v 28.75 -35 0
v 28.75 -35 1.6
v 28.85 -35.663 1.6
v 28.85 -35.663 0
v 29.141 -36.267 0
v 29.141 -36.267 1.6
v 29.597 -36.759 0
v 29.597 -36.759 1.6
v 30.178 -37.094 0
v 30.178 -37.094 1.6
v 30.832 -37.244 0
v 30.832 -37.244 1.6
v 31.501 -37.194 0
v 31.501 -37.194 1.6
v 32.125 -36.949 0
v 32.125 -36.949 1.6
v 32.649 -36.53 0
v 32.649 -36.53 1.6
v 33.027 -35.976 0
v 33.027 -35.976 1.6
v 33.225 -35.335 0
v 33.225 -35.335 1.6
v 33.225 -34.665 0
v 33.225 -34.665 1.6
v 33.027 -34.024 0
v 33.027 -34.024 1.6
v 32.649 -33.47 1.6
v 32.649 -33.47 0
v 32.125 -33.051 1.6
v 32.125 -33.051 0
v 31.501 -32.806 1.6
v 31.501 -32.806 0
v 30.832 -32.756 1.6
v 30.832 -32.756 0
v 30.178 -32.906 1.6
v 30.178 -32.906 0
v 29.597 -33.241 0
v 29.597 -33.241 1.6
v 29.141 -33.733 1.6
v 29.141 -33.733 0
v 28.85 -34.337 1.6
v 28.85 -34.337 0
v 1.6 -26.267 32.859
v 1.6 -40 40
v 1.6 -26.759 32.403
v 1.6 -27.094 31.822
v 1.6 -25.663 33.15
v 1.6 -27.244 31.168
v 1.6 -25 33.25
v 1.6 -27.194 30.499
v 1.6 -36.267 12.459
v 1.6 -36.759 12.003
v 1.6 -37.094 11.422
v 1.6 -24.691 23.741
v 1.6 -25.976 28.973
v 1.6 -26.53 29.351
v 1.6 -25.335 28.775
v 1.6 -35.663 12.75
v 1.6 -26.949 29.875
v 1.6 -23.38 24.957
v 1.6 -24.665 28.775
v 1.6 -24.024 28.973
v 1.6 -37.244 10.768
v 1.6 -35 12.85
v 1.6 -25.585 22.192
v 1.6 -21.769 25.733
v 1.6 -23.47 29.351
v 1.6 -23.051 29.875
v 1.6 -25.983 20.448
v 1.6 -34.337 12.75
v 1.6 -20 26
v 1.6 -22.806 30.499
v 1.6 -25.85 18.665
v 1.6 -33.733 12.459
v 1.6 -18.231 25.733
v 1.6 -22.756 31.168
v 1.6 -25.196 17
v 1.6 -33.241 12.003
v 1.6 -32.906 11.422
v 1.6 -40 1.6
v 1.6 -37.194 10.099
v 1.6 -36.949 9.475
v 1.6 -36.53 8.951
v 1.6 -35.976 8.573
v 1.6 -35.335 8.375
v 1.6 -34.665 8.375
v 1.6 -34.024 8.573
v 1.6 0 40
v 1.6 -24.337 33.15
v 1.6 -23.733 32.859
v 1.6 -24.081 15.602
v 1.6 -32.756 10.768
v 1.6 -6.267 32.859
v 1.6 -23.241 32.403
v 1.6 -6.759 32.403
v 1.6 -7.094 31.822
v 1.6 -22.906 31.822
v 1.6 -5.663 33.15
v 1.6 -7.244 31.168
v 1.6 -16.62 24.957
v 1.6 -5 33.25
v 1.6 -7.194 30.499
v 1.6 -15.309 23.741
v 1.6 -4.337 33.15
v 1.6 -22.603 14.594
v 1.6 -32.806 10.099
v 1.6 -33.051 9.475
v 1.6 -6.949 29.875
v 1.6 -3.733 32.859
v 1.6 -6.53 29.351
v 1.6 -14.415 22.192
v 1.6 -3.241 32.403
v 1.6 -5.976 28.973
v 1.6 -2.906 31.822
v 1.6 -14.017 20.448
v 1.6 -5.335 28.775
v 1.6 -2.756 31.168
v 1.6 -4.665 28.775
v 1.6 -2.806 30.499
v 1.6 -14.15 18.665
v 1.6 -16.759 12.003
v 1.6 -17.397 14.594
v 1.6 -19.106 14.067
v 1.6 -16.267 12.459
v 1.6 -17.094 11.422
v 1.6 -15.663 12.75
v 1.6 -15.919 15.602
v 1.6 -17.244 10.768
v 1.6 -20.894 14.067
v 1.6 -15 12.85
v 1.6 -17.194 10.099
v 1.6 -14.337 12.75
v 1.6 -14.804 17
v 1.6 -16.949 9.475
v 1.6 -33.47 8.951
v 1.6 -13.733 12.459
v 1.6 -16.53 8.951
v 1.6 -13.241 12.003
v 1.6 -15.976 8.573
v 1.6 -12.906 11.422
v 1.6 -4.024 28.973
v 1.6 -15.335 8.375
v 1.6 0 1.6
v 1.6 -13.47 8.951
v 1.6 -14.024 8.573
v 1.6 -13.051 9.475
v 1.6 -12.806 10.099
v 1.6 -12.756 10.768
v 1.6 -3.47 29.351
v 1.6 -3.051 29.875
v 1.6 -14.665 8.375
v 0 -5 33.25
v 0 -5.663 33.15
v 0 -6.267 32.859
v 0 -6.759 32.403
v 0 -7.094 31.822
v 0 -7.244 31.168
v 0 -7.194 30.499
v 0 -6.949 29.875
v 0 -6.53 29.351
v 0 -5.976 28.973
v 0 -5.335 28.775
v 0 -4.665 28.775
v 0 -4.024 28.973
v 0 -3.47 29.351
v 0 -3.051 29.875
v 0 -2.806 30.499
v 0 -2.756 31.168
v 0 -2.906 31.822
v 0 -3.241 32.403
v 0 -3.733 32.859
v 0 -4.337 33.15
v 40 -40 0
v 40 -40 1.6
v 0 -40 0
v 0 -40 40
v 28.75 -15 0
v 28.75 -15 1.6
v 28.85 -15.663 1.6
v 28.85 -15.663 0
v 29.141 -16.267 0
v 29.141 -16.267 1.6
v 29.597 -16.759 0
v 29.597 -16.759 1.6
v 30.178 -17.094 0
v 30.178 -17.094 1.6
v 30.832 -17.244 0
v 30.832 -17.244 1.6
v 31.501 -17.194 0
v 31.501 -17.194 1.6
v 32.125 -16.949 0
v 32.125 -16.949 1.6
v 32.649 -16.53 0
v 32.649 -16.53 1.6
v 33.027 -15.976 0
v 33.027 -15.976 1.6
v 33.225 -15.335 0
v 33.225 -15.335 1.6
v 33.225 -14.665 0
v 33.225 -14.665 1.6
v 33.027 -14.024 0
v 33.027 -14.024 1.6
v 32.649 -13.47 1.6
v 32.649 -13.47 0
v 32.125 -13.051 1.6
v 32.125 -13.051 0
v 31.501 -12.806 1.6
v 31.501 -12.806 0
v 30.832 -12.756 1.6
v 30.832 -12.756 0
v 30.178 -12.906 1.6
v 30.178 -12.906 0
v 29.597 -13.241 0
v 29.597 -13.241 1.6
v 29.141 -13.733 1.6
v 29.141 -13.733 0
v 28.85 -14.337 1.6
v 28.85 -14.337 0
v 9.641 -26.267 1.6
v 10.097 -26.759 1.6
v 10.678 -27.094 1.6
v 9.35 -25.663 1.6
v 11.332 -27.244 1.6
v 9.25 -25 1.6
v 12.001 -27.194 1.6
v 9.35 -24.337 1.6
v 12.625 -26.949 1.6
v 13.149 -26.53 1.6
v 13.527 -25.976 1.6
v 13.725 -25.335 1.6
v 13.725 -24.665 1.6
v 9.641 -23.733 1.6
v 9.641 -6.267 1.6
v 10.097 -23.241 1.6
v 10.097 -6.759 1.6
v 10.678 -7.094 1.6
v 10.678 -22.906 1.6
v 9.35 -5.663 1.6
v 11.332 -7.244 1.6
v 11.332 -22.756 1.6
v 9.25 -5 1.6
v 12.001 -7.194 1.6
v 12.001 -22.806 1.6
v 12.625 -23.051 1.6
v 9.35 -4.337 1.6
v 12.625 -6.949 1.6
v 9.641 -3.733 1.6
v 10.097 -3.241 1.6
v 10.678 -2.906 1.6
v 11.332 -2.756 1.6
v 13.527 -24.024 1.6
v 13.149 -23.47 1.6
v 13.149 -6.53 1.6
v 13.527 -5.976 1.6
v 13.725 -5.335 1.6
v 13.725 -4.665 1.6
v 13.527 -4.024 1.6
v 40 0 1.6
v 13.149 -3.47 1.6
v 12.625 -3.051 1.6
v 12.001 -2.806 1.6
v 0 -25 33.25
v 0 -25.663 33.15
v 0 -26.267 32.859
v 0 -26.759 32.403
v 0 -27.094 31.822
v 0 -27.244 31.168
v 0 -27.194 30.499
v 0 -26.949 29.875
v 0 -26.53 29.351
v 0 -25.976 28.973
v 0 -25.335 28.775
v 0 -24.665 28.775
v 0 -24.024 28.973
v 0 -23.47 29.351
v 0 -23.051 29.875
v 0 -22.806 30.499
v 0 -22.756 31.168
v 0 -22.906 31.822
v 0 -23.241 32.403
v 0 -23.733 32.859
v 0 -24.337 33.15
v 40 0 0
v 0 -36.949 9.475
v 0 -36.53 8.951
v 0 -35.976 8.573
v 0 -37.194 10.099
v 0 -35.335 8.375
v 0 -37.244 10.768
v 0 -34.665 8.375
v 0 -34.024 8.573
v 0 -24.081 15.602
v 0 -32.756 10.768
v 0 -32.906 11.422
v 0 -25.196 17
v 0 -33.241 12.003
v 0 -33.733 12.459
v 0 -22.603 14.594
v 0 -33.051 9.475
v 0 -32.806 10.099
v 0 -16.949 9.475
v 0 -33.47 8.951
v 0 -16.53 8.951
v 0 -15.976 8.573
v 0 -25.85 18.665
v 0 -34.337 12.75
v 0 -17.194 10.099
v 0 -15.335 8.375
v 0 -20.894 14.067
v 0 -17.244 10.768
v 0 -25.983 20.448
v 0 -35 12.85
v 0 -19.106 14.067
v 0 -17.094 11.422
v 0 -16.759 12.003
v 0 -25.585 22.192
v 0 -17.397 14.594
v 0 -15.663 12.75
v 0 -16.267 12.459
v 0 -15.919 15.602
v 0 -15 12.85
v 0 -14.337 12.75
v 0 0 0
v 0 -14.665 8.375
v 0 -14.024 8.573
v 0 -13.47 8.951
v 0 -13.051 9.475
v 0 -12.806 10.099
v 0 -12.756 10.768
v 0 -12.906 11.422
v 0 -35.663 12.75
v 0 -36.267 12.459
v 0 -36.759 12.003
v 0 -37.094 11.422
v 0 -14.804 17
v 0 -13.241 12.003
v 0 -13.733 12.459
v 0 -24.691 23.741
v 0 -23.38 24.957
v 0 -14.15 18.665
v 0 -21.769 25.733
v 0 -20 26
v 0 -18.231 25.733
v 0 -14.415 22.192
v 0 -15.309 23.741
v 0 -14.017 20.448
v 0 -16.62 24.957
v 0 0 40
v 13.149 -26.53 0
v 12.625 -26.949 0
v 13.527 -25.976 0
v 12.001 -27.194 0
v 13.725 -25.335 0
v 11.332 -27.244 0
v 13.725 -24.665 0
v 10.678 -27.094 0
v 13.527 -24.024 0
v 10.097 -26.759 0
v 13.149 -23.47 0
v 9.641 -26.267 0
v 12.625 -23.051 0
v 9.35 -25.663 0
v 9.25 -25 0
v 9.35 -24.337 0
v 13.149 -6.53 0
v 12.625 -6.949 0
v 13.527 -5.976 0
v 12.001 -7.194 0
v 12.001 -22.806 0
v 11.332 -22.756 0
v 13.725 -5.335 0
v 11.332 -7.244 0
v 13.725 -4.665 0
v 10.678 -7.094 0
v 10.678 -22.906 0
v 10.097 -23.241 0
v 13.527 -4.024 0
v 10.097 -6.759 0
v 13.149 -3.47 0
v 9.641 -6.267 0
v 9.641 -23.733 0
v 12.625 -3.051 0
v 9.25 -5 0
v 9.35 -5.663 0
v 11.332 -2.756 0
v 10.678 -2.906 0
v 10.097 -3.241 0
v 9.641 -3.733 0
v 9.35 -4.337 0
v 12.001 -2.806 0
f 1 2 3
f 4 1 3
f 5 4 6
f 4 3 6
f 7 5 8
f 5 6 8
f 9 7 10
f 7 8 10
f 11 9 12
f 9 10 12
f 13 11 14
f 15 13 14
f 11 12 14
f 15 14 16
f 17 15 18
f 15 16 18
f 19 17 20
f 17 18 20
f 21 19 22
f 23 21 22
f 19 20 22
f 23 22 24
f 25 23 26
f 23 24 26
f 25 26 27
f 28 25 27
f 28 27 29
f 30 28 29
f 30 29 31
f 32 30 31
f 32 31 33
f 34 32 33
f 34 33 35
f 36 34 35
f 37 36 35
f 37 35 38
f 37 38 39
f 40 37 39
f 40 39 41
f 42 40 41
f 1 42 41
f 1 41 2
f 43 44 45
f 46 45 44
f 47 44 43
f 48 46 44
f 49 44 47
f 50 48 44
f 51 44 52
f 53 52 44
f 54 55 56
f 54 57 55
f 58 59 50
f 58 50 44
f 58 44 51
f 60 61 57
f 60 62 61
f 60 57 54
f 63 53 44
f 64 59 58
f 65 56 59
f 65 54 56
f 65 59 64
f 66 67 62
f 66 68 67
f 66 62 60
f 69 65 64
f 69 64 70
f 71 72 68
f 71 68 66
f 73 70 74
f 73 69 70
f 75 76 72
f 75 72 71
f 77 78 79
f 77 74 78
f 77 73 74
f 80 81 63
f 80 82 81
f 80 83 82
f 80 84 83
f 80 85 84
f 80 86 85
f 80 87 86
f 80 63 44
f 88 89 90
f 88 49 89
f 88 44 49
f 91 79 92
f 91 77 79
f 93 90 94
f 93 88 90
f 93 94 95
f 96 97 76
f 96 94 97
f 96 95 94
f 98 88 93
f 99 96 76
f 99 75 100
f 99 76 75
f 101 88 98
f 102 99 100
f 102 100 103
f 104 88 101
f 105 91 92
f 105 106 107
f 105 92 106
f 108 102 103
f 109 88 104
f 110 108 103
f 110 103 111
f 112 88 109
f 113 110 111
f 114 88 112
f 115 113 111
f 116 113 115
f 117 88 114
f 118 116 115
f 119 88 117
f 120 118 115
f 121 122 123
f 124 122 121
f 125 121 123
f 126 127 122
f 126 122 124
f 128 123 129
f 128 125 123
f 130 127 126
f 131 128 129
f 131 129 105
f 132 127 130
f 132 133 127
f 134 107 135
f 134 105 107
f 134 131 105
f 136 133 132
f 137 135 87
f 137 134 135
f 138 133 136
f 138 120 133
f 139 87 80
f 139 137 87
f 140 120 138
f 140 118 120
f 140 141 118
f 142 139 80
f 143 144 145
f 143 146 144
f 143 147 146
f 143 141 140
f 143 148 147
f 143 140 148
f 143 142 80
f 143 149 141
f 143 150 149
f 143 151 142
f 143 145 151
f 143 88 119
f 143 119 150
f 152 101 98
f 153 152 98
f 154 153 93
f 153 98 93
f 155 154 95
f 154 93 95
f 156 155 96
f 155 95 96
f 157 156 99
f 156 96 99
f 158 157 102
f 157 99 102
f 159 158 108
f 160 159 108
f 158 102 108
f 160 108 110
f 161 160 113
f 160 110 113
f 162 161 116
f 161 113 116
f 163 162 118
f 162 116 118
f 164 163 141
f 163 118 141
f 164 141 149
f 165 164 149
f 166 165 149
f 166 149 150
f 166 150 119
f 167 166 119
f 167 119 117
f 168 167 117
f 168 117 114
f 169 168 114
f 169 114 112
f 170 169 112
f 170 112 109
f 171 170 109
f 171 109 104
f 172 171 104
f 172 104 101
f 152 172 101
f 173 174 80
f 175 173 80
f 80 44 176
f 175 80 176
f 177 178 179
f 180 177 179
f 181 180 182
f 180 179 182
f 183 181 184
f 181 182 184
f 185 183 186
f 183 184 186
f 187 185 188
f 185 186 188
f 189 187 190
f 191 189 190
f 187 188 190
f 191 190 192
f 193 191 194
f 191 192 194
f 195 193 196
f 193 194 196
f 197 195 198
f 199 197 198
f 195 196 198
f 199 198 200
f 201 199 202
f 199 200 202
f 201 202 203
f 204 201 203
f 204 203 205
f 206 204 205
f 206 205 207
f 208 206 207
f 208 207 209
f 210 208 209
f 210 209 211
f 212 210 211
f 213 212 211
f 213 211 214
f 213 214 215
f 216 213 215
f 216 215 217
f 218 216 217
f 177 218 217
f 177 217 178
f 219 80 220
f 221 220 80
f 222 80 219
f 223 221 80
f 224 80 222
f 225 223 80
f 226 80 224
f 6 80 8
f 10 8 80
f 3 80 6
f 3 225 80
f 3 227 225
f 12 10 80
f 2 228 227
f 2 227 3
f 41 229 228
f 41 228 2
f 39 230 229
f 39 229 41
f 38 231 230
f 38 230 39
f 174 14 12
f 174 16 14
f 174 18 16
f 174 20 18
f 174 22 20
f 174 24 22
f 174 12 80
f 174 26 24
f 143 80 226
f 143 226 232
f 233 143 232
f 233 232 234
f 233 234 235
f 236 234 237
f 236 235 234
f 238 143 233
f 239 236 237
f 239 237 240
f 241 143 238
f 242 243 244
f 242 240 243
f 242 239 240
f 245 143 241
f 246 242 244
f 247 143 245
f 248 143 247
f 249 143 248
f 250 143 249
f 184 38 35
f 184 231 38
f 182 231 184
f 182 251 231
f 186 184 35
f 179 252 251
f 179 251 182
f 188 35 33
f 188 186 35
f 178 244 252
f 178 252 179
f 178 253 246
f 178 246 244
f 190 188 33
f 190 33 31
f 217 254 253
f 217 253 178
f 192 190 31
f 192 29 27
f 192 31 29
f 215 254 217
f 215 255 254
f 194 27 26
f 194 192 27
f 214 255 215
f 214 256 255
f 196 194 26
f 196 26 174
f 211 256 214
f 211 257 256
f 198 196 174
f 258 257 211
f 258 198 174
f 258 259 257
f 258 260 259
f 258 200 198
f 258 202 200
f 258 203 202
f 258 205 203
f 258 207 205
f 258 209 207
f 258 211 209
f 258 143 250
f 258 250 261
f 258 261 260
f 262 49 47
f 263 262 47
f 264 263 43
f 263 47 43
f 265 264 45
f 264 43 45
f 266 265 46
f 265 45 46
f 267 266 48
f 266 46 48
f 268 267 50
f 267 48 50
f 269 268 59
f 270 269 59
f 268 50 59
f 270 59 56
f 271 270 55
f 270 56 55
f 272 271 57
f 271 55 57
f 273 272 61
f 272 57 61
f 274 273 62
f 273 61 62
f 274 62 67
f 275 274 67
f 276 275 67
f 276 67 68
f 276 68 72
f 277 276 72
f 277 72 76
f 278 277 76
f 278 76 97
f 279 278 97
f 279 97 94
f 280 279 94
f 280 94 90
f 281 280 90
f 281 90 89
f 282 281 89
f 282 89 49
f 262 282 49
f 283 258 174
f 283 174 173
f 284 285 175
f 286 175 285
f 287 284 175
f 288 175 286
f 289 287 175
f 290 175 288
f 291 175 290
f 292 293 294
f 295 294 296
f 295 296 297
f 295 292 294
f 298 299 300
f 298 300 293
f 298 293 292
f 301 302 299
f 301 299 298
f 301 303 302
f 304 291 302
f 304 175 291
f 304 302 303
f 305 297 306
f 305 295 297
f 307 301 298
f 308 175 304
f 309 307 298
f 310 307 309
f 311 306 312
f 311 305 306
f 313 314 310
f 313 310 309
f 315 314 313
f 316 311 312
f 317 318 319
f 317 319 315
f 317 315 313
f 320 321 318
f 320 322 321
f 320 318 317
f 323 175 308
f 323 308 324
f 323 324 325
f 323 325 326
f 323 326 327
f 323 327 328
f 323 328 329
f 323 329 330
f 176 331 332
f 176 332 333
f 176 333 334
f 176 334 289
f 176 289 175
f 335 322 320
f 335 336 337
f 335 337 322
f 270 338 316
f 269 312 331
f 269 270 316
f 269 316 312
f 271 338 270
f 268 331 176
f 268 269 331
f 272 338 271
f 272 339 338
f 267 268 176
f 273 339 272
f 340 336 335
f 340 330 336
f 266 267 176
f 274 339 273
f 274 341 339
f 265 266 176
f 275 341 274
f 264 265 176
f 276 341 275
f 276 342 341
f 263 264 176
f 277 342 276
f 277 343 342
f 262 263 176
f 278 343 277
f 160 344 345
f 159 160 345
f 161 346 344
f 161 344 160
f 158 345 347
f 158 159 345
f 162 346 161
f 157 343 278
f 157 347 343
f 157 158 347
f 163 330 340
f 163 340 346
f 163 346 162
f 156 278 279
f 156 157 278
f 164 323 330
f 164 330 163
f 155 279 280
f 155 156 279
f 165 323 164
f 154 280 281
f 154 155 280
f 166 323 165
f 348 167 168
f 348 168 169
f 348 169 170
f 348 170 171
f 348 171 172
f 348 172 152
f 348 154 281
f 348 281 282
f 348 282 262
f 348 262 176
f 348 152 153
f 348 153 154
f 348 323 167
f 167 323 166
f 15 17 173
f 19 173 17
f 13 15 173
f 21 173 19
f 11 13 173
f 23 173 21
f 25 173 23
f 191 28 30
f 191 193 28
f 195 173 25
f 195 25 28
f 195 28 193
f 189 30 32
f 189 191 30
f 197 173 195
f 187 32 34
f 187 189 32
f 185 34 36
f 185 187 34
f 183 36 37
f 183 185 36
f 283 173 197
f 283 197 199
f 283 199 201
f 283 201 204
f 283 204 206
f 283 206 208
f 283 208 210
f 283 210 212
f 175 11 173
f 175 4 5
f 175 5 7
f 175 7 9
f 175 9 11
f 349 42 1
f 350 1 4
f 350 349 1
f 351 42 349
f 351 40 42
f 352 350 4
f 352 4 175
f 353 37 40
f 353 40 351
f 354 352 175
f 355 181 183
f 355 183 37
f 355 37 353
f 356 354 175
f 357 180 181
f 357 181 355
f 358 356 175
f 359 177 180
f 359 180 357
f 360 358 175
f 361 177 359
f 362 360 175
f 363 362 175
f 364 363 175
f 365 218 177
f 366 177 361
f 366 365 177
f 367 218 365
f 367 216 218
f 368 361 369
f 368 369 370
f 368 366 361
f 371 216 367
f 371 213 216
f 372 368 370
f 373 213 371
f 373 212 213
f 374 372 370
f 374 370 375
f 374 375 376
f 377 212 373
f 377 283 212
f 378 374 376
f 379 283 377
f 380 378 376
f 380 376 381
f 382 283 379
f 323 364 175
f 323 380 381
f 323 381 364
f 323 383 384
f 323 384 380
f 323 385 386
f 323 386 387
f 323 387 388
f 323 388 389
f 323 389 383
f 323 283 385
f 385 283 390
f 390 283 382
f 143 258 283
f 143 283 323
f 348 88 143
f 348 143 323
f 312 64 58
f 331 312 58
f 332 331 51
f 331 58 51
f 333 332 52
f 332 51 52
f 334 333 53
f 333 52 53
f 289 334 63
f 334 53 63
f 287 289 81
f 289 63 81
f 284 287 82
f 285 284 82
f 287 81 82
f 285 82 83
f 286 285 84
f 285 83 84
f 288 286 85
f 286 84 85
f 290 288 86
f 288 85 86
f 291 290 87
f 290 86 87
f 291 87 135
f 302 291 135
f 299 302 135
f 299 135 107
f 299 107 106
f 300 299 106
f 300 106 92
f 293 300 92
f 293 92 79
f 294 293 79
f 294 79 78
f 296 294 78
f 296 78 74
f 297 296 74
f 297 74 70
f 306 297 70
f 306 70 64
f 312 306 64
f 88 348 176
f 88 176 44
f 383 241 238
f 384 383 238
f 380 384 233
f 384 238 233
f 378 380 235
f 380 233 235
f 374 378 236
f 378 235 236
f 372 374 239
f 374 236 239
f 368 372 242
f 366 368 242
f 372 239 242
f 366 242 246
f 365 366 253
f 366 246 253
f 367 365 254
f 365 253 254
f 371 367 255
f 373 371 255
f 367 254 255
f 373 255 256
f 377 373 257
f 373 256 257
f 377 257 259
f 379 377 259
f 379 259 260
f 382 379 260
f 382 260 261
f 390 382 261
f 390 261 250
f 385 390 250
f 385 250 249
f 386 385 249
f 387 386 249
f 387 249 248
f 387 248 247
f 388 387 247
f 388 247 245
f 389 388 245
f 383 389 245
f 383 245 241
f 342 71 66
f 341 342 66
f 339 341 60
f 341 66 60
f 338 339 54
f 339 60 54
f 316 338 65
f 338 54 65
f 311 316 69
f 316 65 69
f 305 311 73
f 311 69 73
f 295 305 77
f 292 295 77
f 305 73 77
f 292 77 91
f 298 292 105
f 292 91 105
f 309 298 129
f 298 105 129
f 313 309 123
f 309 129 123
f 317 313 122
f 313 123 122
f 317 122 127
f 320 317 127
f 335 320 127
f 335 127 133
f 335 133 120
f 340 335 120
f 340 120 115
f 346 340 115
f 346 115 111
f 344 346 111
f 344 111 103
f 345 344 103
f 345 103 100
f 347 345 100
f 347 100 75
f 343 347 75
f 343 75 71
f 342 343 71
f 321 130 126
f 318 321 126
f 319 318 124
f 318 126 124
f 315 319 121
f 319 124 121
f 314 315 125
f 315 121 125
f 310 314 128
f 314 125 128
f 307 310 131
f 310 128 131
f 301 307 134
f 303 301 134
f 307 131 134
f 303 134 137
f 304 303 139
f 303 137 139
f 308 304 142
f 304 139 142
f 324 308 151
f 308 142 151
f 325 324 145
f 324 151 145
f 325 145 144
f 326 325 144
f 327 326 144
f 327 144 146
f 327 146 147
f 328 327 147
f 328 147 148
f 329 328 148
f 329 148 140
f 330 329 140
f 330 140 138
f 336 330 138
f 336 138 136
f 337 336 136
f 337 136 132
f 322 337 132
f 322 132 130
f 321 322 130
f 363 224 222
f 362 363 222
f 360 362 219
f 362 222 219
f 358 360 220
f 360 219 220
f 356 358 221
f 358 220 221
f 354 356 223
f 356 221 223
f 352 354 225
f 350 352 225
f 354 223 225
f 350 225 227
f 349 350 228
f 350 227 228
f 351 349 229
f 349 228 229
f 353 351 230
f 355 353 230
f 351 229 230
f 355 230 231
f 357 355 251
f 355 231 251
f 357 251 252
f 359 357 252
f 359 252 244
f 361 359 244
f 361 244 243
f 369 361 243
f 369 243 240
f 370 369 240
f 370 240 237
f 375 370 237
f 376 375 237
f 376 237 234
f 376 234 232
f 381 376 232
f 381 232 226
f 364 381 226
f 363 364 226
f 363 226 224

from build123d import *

# Parameters (mm, degrees)
PAD_DEPTH       = 40
SKETCH001_R     = 2.25
SKETCH001_R_2   = 6
POCKET_DEPTH    = 1.601
COPYSKETCH002_R = 2.25
POCKET001_DEPTH = 5


with BuildPart() as part:
    # Sketch → Pad (new body)
    with BuildSketch(Plane.XZ):
        Polygon((0, 0), (0, 40), (1.6, 40), (1.6, 1.6), (40, 1.6), (40, 0), align=None)
    extrude(amount=PAD_DEPTH)

    # Sketch001 (on Face3 of Pad) → Pocket (cut, through all)
    with BuildSketch(Plane(origin=(1.6, 0, 0), x_dir=(0, 0, 1), z_dir=(1, 0, 0))):
        with Locations((10.6, 35)):
            Circle(SKETCH001_R)
        with Locations((31, 25)):
            Circle(SKETCH001_R)
        with Locations((10.6, 15)):
            Circle(SKETCH001_R)
        with Locations((31, 5)):
            Circle(SKETCH001_R)
        with Locations((20, 20)):
            Circle(SKETCH001_R_2)
    extrude(amount=-POCKET_DEPTH, mode=Mode.SUBTRACT)

    # CopySketch002 → Pocket001 (cut)
    with BuildSketch(Plane(origin=(0, 0, 2.5), x_dir=(-1, 0, 0), z_dir=(0, 0, 1))):
        with Locations((-11.5, 5)):
            Circle(COPYSKETCH002_R)
        with Locations((-31, 15)):
            Circle(COPYSKETCH002_R)
        with Locations((-11.5, 25)):
            Circle(COPYSKETCH002_R)
        with Locations((-31, 35)):
            Circle(COPYSKETCH002_R)
    extrude(amount=-POCKET001_DEPTH, mode=Mode.SUBTRACT)


solid = part.part
